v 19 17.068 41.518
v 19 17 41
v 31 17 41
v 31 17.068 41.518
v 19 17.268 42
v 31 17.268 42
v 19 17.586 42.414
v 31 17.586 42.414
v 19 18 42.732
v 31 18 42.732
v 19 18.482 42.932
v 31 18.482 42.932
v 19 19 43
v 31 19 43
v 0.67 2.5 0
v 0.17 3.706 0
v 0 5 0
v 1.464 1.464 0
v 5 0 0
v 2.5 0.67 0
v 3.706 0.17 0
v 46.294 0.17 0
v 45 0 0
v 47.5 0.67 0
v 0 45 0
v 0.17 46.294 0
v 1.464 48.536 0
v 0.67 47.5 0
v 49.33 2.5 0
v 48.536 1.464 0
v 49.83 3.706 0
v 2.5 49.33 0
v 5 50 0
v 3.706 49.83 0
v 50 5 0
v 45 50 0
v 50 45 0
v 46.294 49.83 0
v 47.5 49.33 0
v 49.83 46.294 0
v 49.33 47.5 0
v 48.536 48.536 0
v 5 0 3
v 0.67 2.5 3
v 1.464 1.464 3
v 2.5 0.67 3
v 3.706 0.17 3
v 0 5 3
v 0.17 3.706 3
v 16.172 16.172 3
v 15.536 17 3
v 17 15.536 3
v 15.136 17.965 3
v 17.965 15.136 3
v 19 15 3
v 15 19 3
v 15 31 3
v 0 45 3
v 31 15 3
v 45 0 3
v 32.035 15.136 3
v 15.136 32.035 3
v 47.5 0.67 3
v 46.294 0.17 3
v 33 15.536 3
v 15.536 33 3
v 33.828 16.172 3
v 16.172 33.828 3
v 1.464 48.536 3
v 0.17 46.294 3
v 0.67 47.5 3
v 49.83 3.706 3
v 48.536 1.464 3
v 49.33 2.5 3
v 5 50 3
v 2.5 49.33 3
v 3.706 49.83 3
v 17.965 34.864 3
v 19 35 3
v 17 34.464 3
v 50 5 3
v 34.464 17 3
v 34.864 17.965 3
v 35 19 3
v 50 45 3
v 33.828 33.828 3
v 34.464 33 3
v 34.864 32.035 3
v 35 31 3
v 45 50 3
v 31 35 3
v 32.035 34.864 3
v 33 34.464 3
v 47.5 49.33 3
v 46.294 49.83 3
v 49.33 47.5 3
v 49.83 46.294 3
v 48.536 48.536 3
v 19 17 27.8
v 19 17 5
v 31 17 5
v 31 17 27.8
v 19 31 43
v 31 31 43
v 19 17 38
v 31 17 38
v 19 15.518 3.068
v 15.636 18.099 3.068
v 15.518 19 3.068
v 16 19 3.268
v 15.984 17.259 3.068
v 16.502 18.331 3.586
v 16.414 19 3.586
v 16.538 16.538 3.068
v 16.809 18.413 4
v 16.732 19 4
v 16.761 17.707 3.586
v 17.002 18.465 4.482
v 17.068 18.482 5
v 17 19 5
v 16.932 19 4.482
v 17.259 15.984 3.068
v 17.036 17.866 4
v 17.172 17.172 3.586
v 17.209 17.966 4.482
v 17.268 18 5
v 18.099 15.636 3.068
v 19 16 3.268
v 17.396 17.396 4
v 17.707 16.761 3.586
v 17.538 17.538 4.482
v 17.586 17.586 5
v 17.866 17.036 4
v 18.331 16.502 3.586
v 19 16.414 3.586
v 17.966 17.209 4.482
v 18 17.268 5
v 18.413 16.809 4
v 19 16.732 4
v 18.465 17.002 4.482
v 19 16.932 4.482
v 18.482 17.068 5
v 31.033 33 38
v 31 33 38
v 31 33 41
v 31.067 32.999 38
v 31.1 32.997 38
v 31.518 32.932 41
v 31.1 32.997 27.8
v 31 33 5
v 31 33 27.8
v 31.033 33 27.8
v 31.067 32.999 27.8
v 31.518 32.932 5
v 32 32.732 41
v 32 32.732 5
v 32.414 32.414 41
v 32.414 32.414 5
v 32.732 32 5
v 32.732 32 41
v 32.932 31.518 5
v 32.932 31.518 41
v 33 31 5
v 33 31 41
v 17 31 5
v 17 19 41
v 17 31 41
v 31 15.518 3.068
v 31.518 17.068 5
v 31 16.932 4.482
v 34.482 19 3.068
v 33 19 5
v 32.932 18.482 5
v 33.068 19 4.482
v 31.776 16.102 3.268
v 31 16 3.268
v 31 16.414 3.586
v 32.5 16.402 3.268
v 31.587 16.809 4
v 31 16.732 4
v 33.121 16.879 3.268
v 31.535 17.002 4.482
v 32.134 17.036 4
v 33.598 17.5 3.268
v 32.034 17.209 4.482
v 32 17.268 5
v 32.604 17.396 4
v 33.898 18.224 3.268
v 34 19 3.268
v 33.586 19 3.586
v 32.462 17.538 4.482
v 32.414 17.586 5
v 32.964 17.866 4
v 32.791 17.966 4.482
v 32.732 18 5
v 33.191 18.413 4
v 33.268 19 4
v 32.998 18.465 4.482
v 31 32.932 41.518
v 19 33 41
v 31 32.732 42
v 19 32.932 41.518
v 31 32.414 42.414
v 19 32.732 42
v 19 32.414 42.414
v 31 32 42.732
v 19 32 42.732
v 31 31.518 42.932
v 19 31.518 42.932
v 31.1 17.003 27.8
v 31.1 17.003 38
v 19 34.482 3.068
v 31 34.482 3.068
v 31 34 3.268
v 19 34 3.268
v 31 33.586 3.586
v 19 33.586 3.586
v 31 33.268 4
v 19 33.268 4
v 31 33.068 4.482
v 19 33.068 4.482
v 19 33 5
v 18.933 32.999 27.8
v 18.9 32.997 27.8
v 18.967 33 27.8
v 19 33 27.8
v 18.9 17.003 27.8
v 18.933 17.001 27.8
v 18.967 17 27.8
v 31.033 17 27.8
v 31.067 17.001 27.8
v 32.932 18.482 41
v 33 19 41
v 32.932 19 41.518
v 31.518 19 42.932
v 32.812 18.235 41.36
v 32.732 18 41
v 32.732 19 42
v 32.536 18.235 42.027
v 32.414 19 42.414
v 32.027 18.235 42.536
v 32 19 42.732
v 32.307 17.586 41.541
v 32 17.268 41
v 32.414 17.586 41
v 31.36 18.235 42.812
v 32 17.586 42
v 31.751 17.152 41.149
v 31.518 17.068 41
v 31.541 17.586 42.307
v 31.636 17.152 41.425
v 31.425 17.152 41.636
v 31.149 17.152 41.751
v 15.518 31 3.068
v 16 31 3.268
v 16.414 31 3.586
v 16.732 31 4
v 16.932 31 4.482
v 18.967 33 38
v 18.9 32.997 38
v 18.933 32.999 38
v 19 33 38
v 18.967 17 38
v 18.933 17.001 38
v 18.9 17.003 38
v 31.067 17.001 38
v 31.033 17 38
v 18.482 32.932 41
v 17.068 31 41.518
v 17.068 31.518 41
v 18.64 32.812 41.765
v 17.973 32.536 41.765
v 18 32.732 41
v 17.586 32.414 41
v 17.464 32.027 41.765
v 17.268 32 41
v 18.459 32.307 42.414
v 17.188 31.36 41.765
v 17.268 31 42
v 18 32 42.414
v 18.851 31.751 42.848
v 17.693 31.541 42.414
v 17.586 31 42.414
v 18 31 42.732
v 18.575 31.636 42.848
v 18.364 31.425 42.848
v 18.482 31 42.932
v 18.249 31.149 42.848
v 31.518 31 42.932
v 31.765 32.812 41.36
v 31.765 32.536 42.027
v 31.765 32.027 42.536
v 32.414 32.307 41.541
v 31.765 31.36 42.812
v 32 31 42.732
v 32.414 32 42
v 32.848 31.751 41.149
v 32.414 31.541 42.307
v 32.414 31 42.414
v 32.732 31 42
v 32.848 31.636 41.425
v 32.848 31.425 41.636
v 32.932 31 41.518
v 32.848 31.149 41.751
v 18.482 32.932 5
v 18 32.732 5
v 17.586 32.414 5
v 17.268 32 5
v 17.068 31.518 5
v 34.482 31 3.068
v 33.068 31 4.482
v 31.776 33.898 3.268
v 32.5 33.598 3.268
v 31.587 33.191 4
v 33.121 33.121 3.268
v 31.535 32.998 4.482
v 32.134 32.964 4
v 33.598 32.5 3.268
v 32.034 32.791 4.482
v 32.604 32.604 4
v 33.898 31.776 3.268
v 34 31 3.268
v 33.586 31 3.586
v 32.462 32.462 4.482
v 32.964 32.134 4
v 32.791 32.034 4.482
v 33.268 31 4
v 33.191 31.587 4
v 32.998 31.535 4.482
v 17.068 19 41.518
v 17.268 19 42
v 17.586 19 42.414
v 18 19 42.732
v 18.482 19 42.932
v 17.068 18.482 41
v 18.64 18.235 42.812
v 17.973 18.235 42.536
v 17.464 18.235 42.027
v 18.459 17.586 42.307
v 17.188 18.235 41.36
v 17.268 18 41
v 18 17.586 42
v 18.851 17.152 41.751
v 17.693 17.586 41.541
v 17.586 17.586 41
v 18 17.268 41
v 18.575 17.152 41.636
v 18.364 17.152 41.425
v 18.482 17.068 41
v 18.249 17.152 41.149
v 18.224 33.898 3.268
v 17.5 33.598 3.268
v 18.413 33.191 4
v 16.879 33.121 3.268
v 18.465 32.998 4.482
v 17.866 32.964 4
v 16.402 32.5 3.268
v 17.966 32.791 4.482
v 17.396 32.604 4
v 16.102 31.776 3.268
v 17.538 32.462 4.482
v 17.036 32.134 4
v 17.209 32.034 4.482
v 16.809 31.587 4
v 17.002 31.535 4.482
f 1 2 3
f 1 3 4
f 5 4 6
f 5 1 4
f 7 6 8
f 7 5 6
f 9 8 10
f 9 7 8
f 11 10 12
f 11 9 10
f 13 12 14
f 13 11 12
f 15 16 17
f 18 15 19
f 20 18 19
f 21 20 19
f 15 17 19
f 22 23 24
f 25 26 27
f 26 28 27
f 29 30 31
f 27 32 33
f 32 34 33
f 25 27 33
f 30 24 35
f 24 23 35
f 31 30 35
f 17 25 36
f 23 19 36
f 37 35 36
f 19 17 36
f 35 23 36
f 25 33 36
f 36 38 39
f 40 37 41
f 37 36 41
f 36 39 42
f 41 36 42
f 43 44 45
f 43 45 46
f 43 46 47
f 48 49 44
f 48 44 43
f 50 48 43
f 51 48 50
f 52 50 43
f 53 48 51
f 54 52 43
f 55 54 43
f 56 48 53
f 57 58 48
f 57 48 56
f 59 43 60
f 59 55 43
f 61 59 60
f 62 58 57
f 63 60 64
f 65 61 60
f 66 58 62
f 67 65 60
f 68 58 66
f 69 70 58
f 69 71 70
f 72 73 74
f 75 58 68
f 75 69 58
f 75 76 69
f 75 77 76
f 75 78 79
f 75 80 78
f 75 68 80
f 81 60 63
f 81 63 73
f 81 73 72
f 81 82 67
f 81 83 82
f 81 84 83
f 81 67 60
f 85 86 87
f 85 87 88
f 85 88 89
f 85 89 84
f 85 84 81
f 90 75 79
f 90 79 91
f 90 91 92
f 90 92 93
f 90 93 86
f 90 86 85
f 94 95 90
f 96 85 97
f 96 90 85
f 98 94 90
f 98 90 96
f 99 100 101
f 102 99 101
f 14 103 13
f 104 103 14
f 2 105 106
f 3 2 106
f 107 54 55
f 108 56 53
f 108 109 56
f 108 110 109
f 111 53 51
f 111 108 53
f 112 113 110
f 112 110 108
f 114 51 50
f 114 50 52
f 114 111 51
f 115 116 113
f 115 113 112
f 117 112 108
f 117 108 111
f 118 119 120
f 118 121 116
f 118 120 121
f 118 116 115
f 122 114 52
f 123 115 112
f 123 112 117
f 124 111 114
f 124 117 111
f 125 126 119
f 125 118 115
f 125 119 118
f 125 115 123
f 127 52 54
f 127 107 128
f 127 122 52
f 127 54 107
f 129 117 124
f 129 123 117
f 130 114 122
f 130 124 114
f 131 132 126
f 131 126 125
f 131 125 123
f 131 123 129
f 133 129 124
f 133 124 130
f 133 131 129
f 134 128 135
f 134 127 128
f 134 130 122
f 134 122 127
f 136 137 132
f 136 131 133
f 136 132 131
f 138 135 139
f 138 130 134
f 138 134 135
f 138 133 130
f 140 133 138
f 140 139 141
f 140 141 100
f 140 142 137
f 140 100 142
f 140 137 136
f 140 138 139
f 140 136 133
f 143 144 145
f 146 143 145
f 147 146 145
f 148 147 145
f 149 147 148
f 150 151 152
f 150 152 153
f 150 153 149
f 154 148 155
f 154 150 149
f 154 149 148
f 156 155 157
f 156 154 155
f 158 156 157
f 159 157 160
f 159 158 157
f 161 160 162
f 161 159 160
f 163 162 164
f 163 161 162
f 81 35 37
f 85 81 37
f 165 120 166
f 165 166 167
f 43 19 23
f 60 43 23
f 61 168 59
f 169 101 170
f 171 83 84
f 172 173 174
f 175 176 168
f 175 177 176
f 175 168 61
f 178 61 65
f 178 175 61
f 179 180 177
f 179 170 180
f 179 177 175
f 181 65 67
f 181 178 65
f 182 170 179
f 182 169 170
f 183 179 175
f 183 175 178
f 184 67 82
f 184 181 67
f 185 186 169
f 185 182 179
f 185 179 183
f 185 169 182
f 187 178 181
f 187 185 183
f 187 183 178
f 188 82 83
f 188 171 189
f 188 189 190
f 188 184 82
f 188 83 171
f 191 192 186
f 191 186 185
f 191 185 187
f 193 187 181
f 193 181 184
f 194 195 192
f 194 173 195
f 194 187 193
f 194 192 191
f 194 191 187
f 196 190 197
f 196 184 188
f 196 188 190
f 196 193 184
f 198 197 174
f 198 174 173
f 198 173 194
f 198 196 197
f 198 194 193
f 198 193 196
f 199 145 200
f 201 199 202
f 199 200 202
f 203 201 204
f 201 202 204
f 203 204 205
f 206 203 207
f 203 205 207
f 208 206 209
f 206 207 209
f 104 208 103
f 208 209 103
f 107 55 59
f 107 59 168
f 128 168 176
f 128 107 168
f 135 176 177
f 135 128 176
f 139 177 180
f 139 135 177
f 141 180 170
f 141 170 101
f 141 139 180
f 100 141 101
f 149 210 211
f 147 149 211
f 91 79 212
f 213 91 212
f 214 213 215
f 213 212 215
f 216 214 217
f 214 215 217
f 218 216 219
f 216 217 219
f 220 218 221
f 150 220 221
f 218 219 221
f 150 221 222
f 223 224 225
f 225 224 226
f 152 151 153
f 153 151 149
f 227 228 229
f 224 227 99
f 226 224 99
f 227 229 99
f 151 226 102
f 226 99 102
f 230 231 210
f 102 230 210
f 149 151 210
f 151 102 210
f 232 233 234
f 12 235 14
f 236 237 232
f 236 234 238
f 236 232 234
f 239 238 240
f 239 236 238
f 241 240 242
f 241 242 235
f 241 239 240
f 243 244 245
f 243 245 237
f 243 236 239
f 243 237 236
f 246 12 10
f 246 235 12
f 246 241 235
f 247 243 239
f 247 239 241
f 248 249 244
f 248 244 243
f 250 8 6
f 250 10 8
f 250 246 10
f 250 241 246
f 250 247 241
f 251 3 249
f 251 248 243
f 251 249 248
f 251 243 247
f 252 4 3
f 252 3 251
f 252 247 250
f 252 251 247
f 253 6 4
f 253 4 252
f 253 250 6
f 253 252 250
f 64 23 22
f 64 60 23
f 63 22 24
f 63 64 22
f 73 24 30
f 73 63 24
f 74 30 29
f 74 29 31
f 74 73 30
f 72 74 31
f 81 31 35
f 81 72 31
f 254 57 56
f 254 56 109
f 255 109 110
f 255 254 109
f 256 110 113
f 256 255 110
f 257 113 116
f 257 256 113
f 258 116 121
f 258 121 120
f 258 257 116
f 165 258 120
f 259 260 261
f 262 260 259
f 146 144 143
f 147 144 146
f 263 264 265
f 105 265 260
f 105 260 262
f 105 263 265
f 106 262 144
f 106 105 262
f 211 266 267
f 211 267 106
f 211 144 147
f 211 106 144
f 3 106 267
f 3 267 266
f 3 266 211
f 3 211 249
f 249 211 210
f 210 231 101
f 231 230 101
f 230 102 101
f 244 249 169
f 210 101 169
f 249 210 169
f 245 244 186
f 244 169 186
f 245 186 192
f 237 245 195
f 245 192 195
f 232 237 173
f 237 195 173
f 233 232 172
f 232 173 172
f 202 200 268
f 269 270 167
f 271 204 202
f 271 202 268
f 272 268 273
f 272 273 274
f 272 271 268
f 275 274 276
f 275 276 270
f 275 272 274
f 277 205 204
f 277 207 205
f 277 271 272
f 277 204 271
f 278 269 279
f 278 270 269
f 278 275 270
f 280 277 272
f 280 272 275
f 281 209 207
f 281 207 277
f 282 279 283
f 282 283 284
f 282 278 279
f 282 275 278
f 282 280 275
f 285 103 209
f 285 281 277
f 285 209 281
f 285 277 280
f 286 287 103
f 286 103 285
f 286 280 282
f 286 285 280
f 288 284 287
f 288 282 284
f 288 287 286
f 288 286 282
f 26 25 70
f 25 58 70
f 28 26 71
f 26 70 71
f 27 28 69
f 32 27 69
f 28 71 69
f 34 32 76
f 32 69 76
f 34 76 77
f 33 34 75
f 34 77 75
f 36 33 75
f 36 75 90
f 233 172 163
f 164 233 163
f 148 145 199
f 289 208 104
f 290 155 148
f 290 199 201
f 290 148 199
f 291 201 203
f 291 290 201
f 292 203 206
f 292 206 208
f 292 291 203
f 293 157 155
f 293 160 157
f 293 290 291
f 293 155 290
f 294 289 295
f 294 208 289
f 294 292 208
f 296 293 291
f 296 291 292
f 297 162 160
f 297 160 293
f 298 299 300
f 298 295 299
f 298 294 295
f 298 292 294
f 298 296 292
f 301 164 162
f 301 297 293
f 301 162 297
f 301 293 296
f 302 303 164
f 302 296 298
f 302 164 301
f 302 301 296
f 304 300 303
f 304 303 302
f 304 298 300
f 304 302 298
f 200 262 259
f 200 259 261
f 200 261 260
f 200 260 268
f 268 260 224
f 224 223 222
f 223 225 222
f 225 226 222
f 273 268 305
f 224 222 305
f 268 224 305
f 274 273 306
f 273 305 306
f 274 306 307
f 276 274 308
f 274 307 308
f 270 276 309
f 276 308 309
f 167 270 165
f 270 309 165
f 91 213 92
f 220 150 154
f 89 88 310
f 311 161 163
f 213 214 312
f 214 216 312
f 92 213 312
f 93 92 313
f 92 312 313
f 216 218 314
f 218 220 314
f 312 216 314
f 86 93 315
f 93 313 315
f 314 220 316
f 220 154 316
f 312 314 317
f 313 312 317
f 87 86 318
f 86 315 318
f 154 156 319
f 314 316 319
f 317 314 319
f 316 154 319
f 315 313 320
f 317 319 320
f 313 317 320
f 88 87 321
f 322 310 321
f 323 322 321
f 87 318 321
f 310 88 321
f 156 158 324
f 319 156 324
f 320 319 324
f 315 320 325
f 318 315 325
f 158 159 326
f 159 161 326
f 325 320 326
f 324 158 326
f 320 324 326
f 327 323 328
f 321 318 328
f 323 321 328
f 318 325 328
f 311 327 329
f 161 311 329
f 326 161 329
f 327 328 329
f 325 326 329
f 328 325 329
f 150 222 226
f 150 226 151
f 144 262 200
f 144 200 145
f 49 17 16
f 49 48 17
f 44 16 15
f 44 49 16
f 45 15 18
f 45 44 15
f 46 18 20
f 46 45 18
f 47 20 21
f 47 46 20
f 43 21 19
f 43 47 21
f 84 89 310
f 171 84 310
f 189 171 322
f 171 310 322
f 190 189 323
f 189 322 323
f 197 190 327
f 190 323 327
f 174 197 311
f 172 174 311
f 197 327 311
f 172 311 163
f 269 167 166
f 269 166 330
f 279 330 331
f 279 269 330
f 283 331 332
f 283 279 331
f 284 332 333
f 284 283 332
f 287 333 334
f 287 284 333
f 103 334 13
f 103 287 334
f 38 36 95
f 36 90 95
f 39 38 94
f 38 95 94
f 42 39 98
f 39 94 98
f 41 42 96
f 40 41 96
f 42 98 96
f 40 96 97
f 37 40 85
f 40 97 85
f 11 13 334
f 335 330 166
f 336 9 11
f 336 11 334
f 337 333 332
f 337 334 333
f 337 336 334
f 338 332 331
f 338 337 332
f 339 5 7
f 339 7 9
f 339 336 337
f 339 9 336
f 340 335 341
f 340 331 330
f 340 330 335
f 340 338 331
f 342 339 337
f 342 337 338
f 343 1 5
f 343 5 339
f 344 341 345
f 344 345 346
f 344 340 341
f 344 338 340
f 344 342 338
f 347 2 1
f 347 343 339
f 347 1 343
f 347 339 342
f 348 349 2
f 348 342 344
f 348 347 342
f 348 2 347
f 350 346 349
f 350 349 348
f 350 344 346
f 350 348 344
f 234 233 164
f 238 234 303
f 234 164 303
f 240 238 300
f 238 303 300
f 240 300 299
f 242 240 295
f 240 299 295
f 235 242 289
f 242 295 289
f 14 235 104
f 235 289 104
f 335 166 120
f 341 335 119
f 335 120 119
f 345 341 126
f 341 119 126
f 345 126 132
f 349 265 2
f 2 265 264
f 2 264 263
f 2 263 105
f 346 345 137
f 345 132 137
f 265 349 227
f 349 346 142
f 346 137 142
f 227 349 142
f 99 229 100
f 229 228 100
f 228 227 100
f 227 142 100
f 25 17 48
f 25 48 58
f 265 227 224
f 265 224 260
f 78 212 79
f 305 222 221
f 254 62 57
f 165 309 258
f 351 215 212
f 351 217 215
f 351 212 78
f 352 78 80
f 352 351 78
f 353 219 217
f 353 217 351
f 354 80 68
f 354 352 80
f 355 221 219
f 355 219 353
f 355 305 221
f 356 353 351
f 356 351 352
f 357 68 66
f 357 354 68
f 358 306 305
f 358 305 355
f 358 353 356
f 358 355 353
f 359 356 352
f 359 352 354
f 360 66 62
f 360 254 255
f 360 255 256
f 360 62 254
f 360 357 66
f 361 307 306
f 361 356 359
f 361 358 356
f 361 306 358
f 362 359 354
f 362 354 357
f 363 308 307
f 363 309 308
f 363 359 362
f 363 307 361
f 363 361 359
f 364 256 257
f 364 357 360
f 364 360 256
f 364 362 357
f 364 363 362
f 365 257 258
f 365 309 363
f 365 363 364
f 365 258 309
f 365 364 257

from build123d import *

# Parameters (mm, degrees)
F0_W         = 50
F0_H         = 50
F1_DEPTH     = 3
F2_W         = 16
F2_H         = 16
F3_DEPTH     = 40
F4_W         = 12.2
F4_H         = 10.2
F5_DEPTH     = 16
F6_T1_DEPTH  = 12
F6_T3_DEPTH  = 12
F6_T5_DEPTH  = 38
F6_S9_W      = 2
F6_S9_H      = 2
F6_T10_DEPTH = 2
F6_S15_W     = 2
F6_S15_H     = 2
F6_T16_DEPTH = 2
F6_S21_W     = 2
F6_S21_H     = 2
F6_T22_DEPTH = 2
F6_S27_W     = 2
F6_S27_H     = 2
F6_T28_DEPTH = 2
F6_T31_DEPTH = 12
F6_T33_DEPTH = 12
F6_T36_ANGLE = 90
F6_T38_ANGLE = 90
F6_T40_ANGLE = 90
F6_T42_ANGLE = 90
F7_R         = 5


# Not quite as in the source:
# - a fillet or chamfer that OpenCascade refuses, or shapes differently, is made with other operations: its cross-section is extruded or revolved along the edge and cut away or added


with BuildPart() as f1:
    # F0 (on Top) → F1 (new body)
    with BuildSketch(Plane.XY):
        with Locations((25, 25)):
            Rectangle(F0_W, F0_H)
    extrude(amount=F1_DEPTH)

    # F2 (on face) → F3 (join)
    with BuildSketch(Plane.XY.offset(3)):
        with Locations((25, 25)):
            Rectangle(F2_W, F2_H)
    extrude(amount=F3_DEPTH)

    # F4 (on face) → F5 (cut)
    with BuildSketch(Plane.XZ.offset(-17)):
        with Locations((25, 32.9)):
            Rectangle(F4_W, F4_H)
    extrude(amount=-F5_DEPTH, mode=Mode.SUBTRACT)

    # F6: fillet of radius 2 on 12 edges, made by hand

    # F6_s2 → F6_t1 (cut)
    with BuildSketch(Plane.YZ.offset(19)):
        with BuildLine():
            ThreePointArc((17, 41), (17.5857864376, 42.4142135624), (19, 43))
            Line((19, 43), (17, 43))
            Line((17, 43), (17, 41))
        make_face()
        with BuildLine():
            ThreePointArc((33, 41), (32.4142135624, 42.4142135624), (31, 43))
            Line((31, 43), (33, 43))
            Line((33, 43), (33, 41))
        make_face()
    extrude(amount=F6_T1_DEPTH, mode=Mode.SUBTRACT)

    # F6_s4 → F6_t3 (cut)
    with BuildSketch(Plane.XZ.offset(-31)):
        with BuildLine():
            ThreePointArc((33, 41), (32.4142135624, 42.4142135624), (31, 43))
            Line((31, 43), (33, 43))
            Line((33, 43), (33, 41))
        make_face()
        with BuildLine():
            ThreePointArc((17, 41), (17.5857864376, 42.4142135624), (19, 43))
            Line((19, 43), (17, 43))
            Line((17, 43), (17, 41))
        make_face()
    extrude(amount=F6_T3_DEPTH, mode=Mode.SUBTRACT)

    # F6_s6 → F6_t5 (cut)
    with BuildSketch(Plane.XY.offset(3)):
        with BuildLine():
            ThreePointArc((31, 17), (32.4142135624, 17.5857864376), (33, 19))
            Line((33, 19), (33, 17))
            Line((33, 17), (31, 17))
        make_face()
        with BuildLine():
            ThreePointArc((31, 33), (32.4142135624, 32.4142135624), (33, 31))
            Line((33, 31), (33, 33))
            Line((33, 33), (31, 33))
        make_face()
        with BuildLine():
            ThreePointArc((17, 19), (17.5857864376, 17.5857864376), (19, 17))
            Line((19, 17), (17, 17))
            Line((17, 17), (17, 19))
        make_face()
        with BuildLine():
            ThreePointArc((19, 33), (17.5857864376, 32.4142135624), (17, 31))
            Line((17, 31), (17, 33))
            Line((17, 33), (19, 33))
        make_face()
    extrude(amount=F6_T5_DEPTH, mode=Mode.SUBTRACT)


with BuildPart() as f6_tool8:
    # F6_s9 → F6_t10 (new body)
    with BuildSketch(Plane.XZ.offset(-19)):
        with Locations((18, 42)):
            Rectangle(F6_S9_W, F6_S9_H)
    extrude(amount=F6_T10_DEPTH)

    # F6_s11 → F6_t12 (revolve, cut)
    with BuildSketch(Plane(origin=(19, 19, 41), x_dir=(0.7071067812, 0, -0.7071067812), z_dir=(-0.7071067812, 0, -0.7071067812))):
        with BuildLine():
            ThreePointArc((0, -2), (2, 0), (0, 2))
            Line((0, 2), (0, -2))
        make_face()
    revolve(axis=Axis((19, 19, 41), (0, -1, 0)), mode=Mode.SUBTRACT)


with BuildPart() as f1_1:
    add(f1.part)

    # F6_t7: cut F6_tool8
    add(f6_tool8.part, mode=Mode.SUBTRACT)


with BuildPart() as f6_tool14:
    # F6_s15 → F6_t16 (new body)
    with BuildSketch(Plane.XZ.offset(-19)):
        with Locations((32, 42)):
            Rectangle(F6_S15_W, F6_S15_H)
    extrude(amount=F6_T16_DEPTH)

    # F6_s17 → F6_t18 (revolve, cut)
    with BuildSketch(Plane(origin=(31, 19, 41), x_dir=(-0.7071067812, 0, -0.7071067812), z_dir=(-0.7071067812, 0, 0.7071067812))):
        with BuildLine():
            ThreePointArc((0, -2), (2, 0), (0, 2))
            Line((0, 2), (0, -2))
        make_face()
    revolve(axis=Axis((31, 19, 41), (0, -1, 0)), mode=Mode.SUBTRACT)


with BuildPart() as f1_2:
    add(f1_1.part)

    # F6_t13: cut F6_tool14
    add(f6_tool14.part, mode=Mode.SUBTRACT)


with BuildPart() as f6_tool20:
    # F6_s21 → F6_t22 (new body)
    with BuildSketch(Plane.YZ.offset(31)):
        with Locations((32, 42)):
            Rectangle(F6_S21_W, F6_S21_H)
    extrude(amount=F6_T22_DEPTH)

    # F6_s23 → F6_t24 (revolve, cut)
    with BuildSketch(Plane(origin=(31, 31, 41), x_dir=(0, -0.7071067812, -0.7071067812), z_dir=(0, -0.7071067812, 0.7071067812))):
        with BuildLine():
            ThreePointArc((0, -2), (2, 0), (0, 2))
            Line((0, 2), (0, -2))
        make_face()
    revolve(axis=Axis((31, 31, 41), (1, 0, 0)), mode=Mode.SUBTRACT)


with BuildPart() as f1_3:
    add(f1_2.part)

    # F6_t19: cut F6_tool20
    add(f6_tool20.part, mode=Mode.SUBTRACT)


with BuildPart() as f6_tool26:
    # F6_s27 → F6_t28 (new body)
    with BuildSketch(Plane.XY.offset(41)):
        with Locations((18, 32)):
            Rectangle(F6_S27_W, F6_S27_H)
    extrude(amount=F6_T28_DEPTH)

    # F6_s29 → F6_t30 (revolve, cut)
    with BuildSketch(Plane(origin=(19, 31, 41), x_dir=(0.7071067812, -0.7071067812, 0), z_dir=(-0.7071067812, -0.7071067812, 0))):
        with BuildLine():
            ThreePointArc((0, -2), (2, 0), (0, 2))
            Line((0, 2), (0, -2))
        make_face()
    revolve(axis=Axis((19, 31, 41), (0, 0, 1)), mode=Mode.SUBTRACT)


with BuildPart() as f1_4:
    add(f1_3.part)

    # F6_t25: cut F6_tool26
    add(f6_tool26.part, mode=Mode.SUBTRACT)

    # F6_s32 → F6_t31 (join)
    with BuildSketch(Plane.YZ.offset(19)):
        with BuildLine():
            ThreePointArc((15, 3), (16.4142135624, 3.5857864376), (17, 5))
            Line((17, 5), (17, 3))
            Line((17, 3), (15, 3))
        make_face()
        with BuildLine():
            ThreePointArc((35, 3), (33.5857864376, 3.5857864376), (33, 5))
            Line((33, 5), (33, 3))
            Line((33, 3), (35, 3))
        make_face()
    extrude(amount=F6_T31_DEPTH)

    # F6_s34 → F6_t33 (join)
    with BuildSketch(Plane.XZ.offset(-31)):
        with BuildLine():
            ThreePointArc((35, 3), (33.5857864376, 3.5857864376), (33, 5))
            Line((33, 5), (33, 3))
            Line((33, 3), (35, 3))
        make_face()
        with BuildLine():
            ThreePointArc((15, 3), (16.4142135624, 3.5857864376), (17, 5))
            Line((17, 5), (17, 3))
            Line((17, 3), (15, 3))
        make_face()
    extrude(amount=F6_T33_DEPTH)

    # F6_s35 → F6_t36 (revolve)
    with BuildSketch(Plane.YZ.offset(31)):
        with BuildLine():
            ThreePointArc((35, 3), (33.5857864376, 3.5857864376), (33, 5))
            Line((33, 5), (33, 3))
            Line((33, 3), (35, 3))
        make_face()
    revolve(axis=Axis((31, 31, 3), (0, 0, -1)), revolution_arc=F6_T36_ANGLE)

    # F6_s37 → F6_t38 (revolve)
    with BuildSketch(Plane.YZ.offset(19)):
        with BuildLine():
            ThreePointArc((35, 3), (33.5857864376, 3.5857864376), (33, 5))
            Line((33, 5), (33, 3))
            Line((33, 3), (35, 3))
        make_face()
    revolve(axis=Axis((19, 31, 3), (0, 0, 1)), revolution_arc=F6_T38_ANGLE)

    # F6_s39 → F6_t40 (revolve)
    with BuildSketch(Plane.XZ.offset(-19)):
        with BuildLine():
            ThreePointArc((15, 3), (16.4142135624, 3.5857864376), (17, 5))
            Line((17, 5), (17, 3))
            Line((17, 3), (15, 3))
        make_face()
    revolve(axis=Axis((19, 19, 3), (0, 0, 1)), revolution_arc=F6_T40_ANGLE)

    # F6_s41 → F6_t42 (revolve)
    with BuildSketch(Plane.YZ.offset(31)):
        with BuildLine():
            ThreePointArc((15, 3), (16.4142135624, 3.5857864376), (17, 5))
            Line((17, 5), (17, 3))
            Line((17, 3), (15, 3))
        make_face()
    revolve(axis=Axis((31, 19, 3), (0, 0, 1)), revolution_arc=F6_T42_ANGLE)

    # F7
    f7_edges = [f1_4.edges().sort_by_distance(p)[0] for p in [
        (0, 0, 1.5),
        (50, 0, 1.5),
        (0, 50, 1.5),
        (50, 50, 1.5),
    ]]
    fillet(f7_edges, radius=F7_R)


solid = f1_4.part
